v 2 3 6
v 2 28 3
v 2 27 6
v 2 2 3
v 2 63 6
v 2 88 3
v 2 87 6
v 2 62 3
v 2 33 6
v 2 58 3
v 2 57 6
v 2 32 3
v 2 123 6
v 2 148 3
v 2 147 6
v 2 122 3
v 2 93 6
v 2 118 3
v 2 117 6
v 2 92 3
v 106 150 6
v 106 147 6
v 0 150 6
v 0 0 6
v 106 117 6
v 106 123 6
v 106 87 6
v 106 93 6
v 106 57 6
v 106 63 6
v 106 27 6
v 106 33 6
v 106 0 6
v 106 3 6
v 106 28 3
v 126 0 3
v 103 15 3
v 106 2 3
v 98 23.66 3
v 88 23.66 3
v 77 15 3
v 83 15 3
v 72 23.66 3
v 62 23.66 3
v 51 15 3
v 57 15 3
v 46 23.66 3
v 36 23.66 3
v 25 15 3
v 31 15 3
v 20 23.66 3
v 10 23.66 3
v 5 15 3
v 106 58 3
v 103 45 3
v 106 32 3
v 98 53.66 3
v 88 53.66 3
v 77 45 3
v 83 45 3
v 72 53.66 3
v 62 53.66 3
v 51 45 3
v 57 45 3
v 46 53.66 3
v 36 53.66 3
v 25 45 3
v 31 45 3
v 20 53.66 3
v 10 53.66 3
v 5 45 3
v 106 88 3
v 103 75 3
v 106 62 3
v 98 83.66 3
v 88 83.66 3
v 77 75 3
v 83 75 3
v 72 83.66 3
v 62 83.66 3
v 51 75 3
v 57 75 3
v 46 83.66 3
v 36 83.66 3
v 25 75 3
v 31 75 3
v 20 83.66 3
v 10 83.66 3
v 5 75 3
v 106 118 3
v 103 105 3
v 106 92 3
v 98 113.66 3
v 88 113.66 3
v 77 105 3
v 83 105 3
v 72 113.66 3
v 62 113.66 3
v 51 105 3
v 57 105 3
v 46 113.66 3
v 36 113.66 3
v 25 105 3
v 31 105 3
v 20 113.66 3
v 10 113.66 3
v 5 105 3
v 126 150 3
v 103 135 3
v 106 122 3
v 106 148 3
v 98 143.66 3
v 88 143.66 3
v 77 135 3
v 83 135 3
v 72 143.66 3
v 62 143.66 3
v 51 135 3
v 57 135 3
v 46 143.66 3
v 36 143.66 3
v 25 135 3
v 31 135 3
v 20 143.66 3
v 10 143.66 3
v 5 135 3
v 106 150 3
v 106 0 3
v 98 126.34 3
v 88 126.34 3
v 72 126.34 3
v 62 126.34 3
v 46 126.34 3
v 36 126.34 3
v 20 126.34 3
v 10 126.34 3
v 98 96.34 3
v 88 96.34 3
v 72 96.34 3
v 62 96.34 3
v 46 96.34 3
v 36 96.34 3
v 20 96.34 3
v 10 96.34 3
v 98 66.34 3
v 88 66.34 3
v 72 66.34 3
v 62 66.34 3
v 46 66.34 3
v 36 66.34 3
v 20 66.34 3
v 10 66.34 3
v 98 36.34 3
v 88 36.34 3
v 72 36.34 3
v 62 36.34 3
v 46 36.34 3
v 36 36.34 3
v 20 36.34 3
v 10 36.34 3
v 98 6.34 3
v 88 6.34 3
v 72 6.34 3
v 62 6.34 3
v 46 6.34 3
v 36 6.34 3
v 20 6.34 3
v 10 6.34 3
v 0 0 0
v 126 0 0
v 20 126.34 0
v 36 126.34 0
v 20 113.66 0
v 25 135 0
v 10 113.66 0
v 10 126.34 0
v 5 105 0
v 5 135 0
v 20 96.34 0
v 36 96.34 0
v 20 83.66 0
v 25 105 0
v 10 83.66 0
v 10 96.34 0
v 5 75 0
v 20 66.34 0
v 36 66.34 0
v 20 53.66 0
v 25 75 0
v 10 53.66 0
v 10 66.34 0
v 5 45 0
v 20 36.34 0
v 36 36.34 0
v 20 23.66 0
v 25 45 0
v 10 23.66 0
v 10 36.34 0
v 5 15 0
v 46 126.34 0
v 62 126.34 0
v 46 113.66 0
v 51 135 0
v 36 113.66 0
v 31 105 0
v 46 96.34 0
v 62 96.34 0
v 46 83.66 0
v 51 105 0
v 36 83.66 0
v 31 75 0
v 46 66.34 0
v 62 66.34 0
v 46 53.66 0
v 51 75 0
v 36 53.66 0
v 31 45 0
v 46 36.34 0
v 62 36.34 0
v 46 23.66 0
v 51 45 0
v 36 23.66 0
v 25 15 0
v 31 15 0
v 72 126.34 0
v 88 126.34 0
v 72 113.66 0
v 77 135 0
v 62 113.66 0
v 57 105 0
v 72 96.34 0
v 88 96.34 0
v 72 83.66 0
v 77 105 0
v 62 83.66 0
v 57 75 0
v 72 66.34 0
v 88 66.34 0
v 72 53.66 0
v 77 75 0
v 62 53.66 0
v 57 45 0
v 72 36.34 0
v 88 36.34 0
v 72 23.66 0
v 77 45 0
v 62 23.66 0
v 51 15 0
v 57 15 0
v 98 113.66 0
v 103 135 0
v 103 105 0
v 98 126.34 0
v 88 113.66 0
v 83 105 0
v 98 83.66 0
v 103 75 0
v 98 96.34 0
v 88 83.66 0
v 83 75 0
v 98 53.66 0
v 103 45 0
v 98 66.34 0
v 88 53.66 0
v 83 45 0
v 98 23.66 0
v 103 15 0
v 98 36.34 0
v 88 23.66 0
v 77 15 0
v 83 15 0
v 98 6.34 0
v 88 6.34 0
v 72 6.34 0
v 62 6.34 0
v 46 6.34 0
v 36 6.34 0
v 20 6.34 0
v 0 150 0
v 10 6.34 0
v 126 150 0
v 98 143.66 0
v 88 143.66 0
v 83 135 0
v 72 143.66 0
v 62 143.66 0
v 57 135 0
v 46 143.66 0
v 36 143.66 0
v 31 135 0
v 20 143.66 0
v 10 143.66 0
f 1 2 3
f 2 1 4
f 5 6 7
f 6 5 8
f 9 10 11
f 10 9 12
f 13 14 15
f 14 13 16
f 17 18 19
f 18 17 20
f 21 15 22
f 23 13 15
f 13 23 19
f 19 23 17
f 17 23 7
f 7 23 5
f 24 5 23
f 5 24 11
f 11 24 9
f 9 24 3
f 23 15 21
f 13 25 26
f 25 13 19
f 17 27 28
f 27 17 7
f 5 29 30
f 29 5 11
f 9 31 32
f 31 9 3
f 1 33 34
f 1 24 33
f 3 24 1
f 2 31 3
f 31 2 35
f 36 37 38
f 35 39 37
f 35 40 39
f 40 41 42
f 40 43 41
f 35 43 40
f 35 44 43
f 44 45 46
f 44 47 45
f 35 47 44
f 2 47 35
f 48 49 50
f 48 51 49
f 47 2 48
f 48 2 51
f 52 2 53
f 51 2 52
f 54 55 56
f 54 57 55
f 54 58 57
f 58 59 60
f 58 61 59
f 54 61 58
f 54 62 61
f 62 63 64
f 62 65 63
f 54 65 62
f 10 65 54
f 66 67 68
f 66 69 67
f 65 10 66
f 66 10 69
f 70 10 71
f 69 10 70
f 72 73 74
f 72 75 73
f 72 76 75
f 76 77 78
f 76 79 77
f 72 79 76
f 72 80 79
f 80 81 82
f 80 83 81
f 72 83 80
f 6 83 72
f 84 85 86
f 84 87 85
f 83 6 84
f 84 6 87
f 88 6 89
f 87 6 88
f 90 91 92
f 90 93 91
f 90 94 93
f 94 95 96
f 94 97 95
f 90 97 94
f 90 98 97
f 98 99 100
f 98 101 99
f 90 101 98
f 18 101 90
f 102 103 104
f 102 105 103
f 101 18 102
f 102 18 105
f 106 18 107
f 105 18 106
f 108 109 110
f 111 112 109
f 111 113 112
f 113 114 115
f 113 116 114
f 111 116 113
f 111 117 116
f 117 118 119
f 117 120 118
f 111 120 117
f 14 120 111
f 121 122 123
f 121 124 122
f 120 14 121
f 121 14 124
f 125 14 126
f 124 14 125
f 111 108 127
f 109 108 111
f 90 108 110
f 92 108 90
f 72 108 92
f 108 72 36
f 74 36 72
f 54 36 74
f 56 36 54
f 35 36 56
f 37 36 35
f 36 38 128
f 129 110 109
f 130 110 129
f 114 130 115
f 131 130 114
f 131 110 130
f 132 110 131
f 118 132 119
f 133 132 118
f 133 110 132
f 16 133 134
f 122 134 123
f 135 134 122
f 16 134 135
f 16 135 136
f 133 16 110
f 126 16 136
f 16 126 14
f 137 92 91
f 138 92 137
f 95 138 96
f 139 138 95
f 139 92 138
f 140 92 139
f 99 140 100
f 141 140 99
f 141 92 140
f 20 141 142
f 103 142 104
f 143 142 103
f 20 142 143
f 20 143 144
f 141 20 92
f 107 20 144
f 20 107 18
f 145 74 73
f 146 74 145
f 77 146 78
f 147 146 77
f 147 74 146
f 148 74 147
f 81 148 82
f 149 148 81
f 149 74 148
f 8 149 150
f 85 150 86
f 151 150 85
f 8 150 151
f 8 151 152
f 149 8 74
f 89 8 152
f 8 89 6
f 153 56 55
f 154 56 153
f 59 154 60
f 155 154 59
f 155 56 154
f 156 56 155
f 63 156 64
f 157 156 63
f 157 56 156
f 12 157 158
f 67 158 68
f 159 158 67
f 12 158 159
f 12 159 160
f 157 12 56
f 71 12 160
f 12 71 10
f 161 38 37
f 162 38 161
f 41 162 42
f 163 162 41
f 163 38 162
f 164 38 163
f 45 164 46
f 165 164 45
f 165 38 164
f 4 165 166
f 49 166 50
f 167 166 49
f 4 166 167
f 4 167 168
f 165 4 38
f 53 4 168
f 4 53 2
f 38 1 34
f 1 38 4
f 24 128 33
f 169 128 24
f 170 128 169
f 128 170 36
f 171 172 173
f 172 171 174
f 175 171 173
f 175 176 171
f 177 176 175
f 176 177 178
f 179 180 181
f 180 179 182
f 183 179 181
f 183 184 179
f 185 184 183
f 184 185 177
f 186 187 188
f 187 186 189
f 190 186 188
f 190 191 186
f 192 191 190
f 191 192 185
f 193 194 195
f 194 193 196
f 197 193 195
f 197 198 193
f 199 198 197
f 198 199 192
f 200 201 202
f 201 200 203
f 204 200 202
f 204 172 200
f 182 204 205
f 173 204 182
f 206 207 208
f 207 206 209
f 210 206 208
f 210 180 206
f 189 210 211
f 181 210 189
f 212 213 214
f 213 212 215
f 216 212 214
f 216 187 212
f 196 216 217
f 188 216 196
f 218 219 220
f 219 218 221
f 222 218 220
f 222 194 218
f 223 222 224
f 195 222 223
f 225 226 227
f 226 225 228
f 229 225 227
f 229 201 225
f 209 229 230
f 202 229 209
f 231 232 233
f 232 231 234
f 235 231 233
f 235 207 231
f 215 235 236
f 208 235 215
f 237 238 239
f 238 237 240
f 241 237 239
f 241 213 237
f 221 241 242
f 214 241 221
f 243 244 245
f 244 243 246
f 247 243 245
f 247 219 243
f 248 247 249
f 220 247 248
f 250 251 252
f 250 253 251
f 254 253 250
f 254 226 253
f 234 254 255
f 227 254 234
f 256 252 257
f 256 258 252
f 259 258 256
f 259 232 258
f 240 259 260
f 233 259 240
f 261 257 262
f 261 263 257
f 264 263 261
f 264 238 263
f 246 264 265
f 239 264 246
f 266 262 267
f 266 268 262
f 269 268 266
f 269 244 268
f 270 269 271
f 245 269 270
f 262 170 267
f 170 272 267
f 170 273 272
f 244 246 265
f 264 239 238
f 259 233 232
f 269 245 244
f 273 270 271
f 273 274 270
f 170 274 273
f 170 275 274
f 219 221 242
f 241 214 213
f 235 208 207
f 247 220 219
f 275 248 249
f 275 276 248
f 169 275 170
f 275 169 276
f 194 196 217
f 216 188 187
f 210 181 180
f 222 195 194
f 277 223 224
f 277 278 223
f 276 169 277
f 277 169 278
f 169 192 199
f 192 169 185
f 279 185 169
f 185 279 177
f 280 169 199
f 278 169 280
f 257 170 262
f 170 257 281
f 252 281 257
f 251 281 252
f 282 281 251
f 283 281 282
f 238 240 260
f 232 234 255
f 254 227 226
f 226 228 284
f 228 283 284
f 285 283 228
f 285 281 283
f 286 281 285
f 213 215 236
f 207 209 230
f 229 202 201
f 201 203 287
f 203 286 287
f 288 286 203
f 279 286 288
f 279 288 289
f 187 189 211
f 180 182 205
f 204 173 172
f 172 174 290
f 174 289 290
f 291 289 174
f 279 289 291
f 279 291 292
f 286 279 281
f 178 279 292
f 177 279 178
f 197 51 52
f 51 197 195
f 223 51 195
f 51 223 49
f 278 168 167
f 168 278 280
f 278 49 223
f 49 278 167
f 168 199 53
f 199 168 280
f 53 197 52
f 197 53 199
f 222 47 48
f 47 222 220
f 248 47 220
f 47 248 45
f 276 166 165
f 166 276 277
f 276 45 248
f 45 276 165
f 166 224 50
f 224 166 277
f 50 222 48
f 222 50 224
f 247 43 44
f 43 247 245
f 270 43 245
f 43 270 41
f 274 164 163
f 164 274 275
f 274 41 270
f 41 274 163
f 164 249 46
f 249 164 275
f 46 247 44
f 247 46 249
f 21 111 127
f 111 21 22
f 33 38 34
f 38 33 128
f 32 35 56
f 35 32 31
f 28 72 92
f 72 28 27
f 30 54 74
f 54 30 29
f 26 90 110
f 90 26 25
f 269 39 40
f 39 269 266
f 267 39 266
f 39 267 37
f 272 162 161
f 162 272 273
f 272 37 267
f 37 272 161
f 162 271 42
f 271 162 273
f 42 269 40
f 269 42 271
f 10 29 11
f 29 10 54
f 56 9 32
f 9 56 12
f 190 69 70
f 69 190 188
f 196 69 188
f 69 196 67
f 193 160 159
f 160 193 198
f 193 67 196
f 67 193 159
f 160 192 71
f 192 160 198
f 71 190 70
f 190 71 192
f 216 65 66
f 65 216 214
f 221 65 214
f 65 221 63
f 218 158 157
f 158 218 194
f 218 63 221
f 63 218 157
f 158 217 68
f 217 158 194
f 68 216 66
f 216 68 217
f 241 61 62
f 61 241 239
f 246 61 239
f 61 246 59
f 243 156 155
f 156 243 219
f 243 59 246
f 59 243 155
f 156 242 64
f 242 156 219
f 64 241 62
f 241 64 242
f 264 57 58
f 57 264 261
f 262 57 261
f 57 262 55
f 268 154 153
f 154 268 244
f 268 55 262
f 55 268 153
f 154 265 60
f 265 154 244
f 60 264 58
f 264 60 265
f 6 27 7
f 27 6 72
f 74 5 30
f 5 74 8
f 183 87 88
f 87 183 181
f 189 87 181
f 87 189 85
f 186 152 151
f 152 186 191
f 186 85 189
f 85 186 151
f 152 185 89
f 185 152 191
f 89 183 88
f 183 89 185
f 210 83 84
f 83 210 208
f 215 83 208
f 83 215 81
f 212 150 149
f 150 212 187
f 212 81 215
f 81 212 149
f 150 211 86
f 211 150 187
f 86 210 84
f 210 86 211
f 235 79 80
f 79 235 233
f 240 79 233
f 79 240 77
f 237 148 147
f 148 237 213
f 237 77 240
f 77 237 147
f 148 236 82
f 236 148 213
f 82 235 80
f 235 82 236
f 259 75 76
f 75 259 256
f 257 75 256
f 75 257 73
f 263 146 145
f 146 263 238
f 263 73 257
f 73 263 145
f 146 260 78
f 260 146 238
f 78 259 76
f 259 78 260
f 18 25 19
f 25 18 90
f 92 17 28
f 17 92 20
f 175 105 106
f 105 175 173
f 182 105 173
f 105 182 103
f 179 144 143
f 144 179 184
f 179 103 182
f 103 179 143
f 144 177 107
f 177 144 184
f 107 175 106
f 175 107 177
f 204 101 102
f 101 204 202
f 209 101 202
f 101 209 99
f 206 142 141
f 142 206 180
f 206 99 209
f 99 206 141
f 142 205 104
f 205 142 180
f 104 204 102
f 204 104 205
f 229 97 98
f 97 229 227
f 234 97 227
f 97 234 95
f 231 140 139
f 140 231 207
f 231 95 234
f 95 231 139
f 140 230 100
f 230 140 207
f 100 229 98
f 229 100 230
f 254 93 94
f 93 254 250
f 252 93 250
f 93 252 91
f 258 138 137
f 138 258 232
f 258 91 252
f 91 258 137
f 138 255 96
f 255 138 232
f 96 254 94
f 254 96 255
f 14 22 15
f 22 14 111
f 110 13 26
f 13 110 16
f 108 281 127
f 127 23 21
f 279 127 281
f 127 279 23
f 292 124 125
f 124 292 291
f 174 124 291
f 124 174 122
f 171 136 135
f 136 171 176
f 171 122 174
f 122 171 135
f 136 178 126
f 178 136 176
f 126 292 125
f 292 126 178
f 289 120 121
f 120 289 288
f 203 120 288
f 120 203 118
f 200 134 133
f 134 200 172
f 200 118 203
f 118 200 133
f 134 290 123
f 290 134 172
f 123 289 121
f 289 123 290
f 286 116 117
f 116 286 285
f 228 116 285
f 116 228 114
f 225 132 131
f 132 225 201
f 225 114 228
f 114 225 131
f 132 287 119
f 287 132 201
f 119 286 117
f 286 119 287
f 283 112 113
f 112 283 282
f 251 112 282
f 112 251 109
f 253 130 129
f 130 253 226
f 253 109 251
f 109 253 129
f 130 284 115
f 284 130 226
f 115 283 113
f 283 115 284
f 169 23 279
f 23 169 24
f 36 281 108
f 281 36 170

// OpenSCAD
rows = 5; // [1:12]
columns = 4; // [1:12]
miniSize = 26; // [20:100]
hexRadius = 10; // [10:50]
topSize = 24; // [20:100]
edgeSize = 2; // [1:10]
baseHeight = 3; // [1:10]
totalHeight = 6; // [1:10]
nameplateWidth = 20; // [1:50]

module Segment() {
    bottomY = 0;
    leftX = 0;
    rightX = miniSize + 2 * edgeSize;
    rotate([90,180,90]) {
      linear_extrude(miniSize) {
        polygon(points = [
               [leftX, bottomY], 
               [rightX, bottomY], 
               [rightX, totalHeight], 
               [rightX - edgeSize - (miniSize - topSize)/2, totalHeight], 
               [rightX - edgeSize, bottomY + baseHeight], 
               [leftX + edgeSize, bottomY + baseHeight],
               [leftX + edgeSize + (miniSize - topSize)/2, totalHeight],
               [leftX, totalHeight],
               [leftX, bottomY]]);
           }
       };
};

module SlottedSegment() {
  rightX = miniSize + 2 * edgeSize;

  difference() {       
    Segment();
    translate([miniSize/2,-rightX/2, -totalHeight]) cylinder(h = totalHeight*2, r1=hexRadius, r2=hexRadius, $fn=6);
  };
};

module MiniGrid() {
    for(y=[0:rows-1]) {
        for(x=[0:columns-1]) {
            translate([x*miniSize, -y*(miniSize+2*edgeSize), 0]) SlottedSegment();
        }
    }
}

module MiniTray() {
    endstopWidth = edgeSize;
    yextent = (miniSize + 2*edgeSize)*rows;
    xextent = endstopWidth + miniSize  * columns;
    ytransform = (miniSize + 2*edgeSize)*(rows-1);
    union() {
        translate([0,0, 0]) rotate([90,180,90]) cube([yextent, totalHeight, endstopWidth]);
        translate([endstopWidth, 0, 0]) MiniGrid();
        translate([xextent,0,0]) rotate([90,180,90]) cube([yextent, baseHeight, nameplateWidth]);
    };
}

rotate([180,0,0]) MiniTray();
